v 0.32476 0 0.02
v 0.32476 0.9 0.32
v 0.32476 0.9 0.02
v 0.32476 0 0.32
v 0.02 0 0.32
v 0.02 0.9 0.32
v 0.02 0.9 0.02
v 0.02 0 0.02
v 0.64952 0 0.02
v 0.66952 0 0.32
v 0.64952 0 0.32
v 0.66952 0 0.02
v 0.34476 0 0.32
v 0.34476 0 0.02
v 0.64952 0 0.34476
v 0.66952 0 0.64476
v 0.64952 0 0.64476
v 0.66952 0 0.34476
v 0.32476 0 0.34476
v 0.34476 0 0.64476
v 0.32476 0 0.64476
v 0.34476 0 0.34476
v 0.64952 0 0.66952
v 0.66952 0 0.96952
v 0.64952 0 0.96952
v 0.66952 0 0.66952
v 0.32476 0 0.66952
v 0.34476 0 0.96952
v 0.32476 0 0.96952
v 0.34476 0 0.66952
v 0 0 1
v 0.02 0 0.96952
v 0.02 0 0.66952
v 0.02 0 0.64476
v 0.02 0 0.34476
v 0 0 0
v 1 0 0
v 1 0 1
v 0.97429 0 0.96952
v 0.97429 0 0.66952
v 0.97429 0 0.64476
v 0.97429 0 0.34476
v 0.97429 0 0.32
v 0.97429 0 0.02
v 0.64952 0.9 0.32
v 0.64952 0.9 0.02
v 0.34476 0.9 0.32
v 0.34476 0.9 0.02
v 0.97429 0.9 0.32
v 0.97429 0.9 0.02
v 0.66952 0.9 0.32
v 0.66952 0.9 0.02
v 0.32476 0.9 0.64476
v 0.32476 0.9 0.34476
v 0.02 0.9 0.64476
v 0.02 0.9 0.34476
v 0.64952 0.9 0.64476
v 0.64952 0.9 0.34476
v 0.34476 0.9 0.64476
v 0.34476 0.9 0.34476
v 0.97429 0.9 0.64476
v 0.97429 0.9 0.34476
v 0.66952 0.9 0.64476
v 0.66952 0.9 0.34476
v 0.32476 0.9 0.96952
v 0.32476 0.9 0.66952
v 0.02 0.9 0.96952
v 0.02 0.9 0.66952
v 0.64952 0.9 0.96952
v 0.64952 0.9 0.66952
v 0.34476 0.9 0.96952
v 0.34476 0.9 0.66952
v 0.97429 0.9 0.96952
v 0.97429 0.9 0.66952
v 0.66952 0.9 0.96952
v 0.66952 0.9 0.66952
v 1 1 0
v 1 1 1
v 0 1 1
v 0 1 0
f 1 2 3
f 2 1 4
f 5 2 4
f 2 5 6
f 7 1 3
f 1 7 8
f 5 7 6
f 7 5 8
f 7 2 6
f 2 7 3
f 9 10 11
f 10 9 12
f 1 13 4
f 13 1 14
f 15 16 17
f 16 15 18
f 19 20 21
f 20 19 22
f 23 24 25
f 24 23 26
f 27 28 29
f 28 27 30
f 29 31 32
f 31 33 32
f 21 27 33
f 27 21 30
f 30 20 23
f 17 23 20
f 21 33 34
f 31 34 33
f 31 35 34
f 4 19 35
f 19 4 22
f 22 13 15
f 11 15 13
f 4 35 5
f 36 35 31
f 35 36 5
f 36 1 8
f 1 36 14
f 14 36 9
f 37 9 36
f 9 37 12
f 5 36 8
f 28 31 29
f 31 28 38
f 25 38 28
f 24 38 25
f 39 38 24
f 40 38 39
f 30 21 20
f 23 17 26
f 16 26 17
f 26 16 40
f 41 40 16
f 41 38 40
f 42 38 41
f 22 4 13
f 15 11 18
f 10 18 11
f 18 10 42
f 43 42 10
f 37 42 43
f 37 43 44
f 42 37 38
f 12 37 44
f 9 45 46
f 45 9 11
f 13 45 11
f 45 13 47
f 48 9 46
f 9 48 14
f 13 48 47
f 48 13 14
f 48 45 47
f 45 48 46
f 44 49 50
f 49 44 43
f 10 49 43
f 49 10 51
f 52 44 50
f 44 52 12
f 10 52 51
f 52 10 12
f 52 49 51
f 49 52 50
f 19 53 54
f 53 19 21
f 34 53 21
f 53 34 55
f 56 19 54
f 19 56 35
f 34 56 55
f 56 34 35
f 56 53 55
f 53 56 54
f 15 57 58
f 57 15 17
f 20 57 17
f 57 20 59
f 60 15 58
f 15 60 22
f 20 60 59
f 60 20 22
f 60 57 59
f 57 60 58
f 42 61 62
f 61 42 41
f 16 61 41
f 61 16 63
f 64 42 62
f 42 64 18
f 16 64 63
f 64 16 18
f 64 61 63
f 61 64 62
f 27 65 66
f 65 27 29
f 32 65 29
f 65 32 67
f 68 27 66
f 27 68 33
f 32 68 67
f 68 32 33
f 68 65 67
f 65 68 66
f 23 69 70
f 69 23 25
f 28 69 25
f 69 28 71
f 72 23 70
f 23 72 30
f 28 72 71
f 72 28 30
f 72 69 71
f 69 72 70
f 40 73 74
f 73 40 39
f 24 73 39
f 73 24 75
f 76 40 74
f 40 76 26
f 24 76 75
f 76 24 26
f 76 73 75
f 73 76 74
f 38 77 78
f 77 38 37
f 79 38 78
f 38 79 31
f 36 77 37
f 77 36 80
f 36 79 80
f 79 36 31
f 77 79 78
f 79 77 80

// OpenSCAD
width = 1;
height = 1;
depth = 1;
offset = 0.02;
cubewidth = (width-2*offset)/3.15;
difference() {
    cube([width,depth,height]);
    union() {
        translate([offset,0.0,offset]) cube([cubewidth,0.9,0.3]);
        translate([offset+cubewidth+offset,0.0,offset]) cube([cubewidth,0.9,0.3]);
        translate([offset+cubewidth+offset+cubewidth+offset,0.0,offset]) cube([cubewidth,0.9,0.3]);

        translate([offset,0.0,offset+cubewidth+offset]) cube([cubewidth,0.9,0.3]);
        translate([offset+cubewidth+offset,0.0,offset+cubewidth+offset]) cube([cubewidth,0.9,0.3]);
        translate([offset+cubewidth+offset+cubewidth+offset,0.0,offset+cubewidth+offset]) cube([cubewidth,0.9,0.3]);

        translate([offset,0.0,offset+cubewidth+offset+cubewidth+offset]) cube([cubewidth,0.9,0.3]);
        translate([offset+cubewidth+offset,0.0,offset+cubewidth+offset+cubewidth+offset]) cube([cubewidth,0.9,0.3]);
        translate([offset+cubewidth+offset+cubewidth+offset,0.0,offset+cubewidth+offset+cubewidth+offset]) cube([cubewidth,0.9,0.3]);
    }
}
